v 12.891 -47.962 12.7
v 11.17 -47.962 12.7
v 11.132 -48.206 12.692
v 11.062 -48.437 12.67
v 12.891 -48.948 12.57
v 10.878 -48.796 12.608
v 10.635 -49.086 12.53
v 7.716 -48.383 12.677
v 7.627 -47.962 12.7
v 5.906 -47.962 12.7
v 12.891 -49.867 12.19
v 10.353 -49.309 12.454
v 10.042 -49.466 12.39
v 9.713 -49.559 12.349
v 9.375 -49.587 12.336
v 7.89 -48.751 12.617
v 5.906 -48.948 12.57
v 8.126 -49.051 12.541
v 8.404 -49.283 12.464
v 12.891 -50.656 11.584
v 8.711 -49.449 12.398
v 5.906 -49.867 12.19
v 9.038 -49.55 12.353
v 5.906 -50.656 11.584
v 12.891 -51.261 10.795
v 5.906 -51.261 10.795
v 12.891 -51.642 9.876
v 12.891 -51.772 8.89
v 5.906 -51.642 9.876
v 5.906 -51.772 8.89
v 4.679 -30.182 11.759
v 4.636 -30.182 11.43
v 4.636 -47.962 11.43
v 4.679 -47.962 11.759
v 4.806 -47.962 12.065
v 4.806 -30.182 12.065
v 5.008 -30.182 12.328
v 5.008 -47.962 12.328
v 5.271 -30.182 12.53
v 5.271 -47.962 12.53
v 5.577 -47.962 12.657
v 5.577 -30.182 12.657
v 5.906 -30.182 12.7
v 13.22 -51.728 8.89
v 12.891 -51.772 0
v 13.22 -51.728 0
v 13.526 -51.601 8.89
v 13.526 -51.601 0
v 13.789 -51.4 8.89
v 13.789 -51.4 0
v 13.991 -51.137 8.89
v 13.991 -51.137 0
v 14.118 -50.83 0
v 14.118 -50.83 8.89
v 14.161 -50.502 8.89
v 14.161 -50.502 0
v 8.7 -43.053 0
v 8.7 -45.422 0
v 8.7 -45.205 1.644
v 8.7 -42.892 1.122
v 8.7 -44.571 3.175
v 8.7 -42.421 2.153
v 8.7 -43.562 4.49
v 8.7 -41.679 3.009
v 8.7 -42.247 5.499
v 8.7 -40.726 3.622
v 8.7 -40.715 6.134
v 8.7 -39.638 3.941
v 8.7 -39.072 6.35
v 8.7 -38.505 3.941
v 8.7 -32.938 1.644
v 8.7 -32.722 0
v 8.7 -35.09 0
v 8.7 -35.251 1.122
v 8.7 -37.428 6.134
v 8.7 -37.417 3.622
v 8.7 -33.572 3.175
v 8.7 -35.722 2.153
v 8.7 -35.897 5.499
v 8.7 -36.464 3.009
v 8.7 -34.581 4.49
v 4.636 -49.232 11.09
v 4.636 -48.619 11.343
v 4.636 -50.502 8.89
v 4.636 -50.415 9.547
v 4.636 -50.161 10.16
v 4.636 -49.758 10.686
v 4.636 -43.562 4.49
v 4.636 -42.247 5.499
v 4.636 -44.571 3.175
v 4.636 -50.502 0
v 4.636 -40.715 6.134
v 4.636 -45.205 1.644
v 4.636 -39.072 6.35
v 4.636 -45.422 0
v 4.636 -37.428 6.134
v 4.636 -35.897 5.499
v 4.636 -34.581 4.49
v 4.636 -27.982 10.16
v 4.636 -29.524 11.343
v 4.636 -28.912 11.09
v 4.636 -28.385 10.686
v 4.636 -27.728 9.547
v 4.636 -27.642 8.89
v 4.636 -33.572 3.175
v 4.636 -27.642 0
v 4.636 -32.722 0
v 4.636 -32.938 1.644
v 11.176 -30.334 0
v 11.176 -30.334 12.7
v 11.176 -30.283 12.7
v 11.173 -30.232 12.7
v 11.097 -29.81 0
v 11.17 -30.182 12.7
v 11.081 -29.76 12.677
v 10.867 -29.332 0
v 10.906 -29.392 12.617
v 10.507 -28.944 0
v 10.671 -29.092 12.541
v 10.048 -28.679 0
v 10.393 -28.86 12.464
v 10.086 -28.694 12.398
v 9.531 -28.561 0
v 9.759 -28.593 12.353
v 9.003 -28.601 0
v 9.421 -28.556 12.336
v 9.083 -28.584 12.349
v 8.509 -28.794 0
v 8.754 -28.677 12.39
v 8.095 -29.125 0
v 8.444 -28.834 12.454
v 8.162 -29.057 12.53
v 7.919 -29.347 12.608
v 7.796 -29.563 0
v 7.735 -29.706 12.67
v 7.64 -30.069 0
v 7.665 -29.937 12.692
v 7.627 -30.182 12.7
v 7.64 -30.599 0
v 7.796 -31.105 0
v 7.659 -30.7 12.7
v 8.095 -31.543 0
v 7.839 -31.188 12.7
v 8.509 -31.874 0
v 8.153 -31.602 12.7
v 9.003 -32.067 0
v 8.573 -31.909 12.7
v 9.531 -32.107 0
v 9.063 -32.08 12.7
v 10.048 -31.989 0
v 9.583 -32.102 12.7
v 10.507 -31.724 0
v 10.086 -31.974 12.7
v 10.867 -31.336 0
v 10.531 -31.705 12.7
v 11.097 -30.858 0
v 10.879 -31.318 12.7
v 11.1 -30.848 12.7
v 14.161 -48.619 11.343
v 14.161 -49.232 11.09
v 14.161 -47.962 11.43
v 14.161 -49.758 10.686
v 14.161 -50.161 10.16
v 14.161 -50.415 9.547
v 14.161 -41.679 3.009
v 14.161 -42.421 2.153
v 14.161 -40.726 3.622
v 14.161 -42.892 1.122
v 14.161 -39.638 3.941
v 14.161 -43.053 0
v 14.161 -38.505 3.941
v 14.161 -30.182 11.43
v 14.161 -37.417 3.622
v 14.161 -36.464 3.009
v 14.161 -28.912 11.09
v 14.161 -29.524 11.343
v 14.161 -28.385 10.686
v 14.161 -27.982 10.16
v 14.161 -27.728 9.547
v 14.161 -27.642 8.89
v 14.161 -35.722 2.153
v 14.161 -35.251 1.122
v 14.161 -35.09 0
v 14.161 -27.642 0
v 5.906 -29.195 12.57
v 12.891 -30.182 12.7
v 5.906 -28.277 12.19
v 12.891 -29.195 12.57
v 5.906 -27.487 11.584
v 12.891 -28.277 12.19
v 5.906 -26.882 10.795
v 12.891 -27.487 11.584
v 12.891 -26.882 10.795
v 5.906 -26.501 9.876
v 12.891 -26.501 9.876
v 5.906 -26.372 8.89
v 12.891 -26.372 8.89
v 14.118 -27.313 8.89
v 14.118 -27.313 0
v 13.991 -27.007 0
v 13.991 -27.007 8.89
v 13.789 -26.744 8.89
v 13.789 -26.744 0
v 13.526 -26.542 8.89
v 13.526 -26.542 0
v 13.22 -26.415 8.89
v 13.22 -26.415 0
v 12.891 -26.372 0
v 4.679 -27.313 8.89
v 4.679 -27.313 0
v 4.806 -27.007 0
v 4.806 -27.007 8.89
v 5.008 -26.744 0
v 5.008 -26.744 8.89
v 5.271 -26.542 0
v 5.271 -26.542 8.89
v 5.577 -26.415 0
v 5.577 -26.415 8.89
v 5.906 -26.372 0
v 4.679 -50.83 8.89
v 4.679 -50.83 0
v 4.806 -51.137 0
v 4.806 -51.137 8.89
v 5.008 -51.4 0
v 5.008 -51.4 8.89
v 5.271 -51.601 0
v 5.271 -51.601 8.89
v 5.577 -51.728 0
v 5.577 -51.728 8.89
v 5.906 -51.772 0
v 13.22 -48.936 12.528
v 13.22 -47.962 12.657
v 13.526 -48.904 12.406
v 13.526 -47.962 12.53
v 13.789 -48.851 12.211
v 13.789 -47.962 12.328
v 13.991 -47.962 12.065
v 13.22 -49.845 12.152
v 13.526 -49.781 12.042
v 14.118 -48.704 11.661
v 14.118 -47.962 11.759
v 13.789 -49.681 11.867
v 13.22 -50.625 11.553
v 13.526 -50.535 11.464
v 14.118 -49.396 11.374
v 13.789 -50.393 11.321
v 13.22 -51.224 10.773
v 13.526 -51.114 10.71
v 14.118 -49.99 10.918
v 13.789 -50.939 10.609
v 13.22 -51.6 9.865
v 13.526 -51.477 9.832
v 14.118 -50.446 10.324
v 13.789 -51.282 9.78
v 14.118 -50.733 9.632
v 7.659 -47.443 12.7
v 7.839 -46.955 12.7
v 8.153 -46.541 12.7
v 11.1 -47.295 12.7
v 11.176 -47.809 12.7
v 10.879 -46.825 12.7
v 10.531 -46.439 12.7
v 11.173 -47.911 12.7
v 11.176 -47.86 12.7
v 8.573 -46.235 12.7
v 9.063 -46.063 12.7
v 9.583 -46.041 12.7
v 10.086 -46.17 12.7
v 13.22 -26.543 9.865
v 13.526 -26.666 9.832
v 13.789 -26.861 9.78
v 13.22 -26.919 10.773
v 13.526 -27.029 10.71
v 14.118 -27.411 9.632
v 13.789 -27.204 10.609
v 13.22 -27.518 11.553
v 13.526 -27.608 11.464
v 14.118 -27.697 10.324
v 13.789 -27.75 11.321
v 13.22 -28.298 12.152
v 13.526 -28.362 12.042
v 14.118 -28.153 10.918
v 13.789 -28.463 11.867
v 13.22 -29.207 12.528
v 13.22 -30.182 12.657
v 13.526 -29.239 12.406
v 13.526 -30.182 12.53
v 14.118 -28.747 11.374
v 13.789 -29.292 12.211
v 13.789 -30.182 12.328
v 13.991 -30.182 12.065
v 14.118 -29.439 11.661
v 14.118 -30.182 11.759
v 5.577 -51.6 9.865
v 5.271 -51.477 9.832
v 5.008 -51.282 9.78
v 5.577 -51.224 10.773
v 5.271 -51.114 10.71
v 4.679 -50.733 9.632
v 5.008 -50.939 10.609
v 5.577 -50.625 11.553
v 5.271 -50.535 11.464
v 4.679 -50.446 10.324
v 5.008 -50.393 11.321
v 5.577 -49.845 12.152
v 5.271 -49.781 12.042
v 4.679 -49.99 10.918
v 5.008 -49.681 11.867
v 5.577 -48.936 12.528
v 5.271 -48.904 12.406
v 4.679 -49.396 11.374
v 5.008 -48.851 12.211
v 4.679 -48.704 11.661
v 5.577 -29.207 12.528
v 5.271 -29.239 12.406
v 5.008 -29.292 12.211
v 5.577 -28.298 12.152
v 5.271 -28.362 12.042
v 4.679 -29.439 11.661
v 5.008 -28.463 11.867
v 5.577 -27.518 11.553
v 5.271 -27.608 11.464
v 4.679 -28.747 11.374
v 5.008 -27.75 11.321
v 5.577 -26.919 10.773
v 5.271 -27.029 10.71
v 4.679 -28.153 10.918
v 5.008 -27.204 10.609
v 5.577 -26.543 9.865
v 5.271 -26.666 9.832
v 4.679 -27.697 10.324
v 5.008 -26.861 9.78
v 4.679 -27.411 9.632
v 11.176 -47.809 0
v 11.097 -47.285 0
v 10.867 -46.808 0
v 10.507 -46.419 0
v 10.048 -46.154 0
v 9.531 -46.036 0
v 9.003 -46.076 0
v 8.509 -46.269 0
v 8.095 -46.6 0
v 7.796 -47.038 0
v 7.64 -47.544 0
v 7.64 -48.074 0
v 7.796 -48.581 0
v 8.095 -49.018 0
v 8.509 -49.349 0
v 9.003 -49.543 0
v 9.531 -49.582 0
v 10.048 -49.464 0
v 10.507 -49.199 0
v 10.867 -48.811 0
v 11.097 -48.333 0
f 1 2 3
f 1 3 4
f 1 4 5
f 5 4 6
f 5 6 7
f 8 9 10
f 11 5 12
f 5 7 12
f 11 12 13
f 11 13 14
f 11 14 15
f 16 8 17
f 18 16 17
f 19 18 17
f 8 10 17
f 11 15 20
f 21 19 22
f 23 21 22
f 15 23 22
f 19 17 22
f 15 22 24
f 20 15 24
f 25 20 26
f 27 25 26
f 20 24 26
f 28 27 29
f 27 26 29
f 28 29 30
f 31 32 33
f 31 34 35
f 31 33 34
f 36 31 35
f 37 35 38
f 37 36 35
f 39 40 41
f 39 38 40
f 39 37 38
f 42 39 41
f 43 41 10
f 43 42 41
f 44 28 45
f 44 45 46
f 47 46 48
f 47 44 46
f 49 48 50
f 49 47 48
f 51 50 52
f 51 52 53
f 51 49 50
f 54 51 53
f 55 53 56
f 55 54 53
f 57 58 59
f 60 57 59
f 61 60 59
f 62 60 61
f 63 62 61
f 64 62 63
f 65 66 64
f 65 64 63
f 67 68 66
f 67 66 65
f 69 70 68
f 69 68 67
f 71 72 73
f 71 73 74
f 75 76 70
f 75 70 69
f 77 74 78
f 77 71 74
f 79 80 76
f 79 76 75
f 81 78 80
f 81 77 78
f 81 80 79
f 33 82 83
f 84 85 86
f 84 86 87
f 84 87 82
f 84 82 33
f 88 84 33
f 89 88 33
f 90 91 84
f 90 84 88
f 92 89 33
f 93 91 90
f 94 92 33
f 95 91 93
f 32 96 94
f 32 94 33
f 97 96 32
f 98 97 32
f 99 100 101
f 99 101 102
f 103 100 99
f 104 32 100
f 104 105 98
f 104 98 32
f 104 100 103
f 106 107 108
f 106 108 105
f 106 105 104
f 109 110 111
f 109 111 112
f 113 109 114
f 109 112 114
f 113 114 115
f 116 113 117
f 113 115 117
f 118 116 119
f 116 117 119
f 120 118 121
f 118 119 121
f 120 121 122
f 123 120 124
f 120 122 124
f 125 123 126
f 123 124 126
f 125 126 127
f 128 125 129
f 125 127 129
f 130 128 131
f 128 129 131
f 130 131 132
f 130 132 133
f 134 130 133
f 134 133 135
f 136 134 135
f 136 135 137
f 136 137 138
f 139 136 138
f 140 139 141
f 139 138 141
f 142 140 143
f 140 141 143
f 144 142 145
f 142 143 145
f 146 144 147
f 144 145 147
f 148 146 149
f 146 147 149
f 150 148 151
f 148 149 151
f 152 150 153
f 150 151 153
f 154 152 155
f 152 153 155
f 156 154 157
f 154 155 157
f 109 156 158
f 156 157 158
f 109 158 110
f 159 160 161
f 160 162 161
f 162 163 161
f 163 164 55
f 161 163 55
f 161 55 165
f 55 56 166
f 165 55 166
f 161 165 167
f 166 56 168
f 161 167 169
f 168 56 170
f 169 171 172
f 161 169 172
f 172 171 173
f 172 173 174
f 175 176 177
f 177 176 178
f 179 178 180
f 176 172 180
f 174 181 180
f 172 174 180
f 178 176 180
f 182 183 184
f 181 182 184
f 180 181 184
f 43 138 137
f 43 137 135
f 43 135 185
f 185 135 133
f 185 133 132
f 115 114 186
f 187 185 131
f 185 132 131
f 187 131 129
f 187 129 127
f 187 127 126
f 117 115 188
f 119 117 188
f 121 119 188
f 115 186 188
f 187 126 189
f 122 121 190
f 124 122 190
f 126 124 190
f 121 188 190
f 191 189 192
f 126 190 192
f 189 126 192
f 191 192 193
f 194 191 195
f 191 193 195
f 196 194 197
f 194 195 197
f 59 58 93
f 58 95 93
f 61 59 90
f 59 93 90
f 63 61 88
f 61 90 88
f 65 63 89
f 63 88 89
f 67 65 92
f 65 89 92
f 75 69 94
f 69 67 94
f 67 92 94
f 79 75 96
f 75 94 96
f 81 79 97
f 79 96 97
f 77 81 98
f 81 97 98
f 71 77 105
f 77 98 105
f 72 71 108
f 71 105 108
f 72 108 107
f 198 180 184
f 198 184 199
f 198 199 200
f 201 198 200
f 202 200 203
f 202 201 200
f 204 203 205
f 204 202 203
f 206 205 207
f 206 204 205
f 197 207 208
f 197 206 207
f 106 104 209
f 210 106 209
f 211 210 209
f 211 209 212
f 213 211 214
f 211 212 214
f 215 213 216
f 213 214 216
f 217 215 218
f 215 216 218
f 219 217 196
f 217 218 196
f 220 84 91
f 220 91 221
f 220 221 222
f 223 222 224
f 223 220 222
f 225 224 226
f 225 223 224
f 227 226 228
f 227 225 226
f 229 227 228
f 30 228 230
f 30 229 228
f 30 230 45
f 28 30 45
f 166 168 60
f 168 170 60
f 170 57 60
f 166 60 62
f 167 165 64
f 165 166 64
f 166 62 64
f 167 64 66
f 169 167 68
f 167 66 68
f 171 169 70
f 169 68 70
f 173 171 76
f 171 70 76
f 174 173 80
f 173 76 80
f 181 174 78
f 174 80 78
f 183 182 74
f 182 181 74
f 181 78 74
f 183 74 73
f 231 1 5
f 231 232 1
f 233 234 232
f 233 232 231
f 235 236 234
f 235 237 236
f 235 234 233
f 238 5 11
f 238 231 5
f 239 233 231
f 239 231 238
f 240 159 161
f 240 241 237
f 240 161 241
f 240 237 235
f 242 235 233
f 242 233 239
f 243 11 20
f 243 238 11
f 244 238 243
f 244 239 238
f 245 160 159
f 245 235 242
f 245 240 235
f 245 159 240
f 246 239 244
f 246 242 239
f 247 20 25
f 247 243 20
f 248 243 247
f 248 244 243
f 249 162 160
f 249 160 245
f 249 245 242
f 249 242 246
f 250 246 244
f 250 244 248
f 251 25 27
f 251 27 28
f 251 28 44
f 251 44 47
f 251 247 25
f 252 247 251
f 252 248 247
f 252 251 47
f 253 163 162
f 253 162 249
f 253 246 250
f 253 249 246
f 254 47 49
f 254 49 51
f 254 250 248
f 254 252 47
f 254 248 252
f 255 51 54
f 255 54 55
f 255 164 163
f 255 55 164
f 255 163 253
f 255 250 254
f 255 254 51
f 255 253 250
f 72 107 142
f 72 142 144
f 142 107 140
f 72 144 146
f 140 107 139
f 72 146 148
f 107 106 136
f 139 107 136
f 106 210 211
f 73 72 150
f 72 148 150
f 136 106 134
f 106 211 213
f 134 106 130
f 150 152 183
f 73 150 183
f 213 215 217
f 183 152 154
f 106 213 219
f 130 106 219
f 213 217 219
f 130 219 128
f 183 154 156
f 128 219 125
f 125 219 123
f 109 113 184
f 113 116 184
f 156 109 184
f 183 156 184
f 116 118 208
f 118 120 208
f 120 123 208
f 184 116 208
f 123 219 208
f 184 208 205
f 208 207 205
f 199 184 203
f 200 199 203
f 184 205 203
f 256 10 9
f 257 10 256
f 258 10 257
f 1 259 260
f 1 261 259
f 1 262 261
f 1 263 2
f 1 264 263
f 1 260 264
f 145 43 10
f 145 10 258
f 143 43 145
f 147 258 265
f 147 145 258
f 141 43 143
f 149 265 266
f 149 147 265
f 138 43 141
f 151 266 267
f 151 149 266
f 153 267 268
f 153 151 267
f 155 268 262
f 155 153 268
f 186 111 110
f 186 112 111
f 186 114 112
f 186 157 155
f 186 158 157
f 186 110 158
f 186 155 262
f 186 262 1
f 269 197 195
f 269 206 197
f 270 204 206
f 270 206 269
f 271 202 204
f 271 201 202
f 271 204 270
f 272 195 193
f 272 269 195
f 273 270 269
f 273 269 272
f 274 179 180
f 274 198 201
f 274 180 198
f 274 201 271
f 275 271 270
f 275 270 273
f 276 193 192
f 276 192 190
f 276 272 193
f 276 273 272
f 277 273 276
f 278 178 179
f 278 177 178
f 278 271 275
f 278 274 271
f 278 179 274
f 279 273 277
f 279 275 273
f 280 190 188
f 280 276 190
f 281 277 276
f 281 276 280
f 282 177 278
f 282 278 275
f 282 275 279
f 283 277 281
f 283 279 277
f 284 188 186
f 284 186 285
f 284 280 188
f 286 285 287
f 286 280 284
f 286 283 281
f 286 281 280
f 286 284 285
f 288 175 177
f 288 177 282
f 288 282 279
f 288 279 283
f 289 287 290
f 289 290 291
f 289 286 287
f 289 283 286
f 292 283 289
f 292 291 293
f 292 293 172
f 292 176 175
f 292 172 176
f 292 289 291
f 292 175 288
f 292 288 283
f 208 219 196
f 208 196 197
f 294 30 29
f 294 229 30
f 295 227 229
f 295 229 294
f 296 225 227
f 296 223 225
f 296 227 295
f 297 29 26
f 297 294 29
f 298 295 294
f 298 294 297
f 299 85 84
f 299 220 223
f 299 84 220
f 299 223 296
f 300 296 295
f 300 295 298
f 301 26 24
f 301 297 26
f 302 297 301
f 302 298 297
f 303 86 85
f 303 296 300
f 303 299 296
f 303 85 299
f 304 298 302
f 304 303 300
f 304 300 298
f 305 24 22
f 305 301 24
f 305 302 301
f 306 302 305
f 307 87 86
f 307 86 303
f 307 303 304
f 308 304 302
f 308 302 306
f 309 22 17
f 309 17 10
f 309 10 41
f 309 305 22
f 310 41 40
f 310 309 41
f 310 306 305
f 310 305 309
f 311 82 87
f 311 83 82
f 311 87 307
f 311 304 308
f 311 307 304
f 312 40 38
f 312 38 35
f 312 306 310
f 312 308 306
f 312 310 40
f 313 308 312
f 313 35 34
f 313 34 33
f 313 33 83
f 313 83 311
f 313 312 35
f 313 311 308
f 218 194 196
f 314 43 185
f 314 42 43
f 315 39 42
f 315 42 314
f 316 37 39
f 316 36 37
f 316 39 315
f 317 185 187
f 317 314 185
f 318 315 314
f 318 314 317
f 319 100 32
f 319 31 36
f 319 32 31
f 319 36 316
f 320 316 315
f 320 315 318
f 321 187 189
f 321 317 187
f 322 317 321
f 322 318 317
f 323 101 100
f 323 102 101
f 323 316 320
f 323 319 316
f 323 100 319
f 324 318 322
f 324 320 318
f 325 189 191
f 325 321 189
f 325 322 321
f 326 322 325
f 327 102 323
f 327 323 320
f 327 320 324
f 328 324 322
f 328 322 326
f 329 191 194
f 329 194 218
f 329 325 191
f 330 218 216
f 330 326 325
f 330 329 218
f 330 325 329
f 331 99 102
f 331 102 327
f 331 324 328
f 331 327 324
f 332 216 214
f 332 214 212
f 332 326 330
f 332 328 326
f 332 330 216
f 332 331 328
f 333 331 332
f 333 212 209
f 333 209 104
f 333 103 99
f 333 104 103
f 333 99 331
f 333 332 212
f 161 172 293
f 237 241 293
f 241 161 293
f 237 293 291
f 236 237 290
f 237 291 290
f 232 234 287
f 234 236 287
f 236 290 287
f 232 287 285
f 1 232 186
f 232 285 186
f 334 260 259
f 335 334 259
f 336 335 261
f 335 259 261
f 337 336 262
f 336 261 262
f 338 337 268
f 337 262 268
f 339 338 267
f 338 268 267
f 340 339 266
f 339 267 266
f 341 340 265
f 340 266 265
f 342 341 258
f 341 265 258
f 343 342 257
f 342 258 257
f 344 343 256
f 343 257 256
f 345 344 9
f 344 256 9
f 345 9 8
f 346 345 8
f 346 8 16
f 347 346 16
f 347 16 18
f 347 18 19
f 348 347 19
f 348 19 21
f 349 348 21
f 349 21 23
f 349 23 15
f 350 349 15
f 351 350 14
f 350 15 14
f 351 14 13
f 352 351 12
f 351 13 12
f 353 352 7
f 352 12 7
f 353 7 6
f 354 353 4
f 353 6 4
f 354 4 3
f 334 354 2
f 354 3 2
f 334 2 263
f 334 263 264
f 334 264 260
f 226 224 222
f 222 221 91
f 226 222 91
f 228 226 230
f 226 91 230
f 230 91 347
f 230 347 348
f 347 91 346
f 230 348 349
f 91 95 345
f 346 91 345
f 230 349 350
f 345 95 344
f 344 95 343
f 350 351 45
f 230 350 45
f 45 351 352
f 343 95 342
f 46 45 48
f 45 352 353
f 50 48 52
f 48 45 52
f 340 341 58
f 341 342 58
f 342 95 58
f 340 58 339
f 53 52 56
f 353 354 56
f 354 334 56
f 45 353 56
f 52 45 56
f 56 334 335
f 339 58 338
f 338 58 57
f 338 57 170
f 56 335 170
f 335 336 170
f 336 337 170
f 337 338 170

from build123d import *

# Parameters (mm, degrees)
SKETCH2_W           = 9.525
SKETCH2_H           = 25.4
BOSS_EXTRUDE1_DEPTH = 12.7
FILLET1_R           = 1.27
FILLET2_R           = 3.81
SKETCH15_R          = 3.981833791
CUT_EXTRUDE12_DEPTH = 55.150798834
SKETCH14_R          = 6.35
CUT_EXTRUDE13_DEPTH = 4.064
SKETCH17_R          = 1.778
CUT_EXTRUDE14_DEPTH = 56.155369014


with BuildPart() as part:
    # Sketch2 → Boss-Extrude1 (new body)
    with BuildSketch(Plane.XY):
        with Locations((9.39840893, -39.07155)):
            Rectangle(SKETCH2_W, SKETCH2_H)
    extrude(amount=BOSS_EXTRUDE1_DEPTH)

    # Fillet1
    fillet1_edges = [part.edges().sort_by_distance(p)[0] for p in [
        (4.63590893, -39.07155, 12.7),
        (14.16090893, -39.07155, 12.7),
        (4.63590893, -51.77155, 6.35),
        (4.63590893, -26.37155, 6.35),
        (14.16090893, -26.37155, 6.35),
        (14.16090893, -51.77155, 6.35),
    ]]
    fillet(fillet1_edges, radius=FILLET1_R)

    # Fillet2
    # the kernel refuses this fillet: 3.81 mm, written as the material it takes off along each edge
    with BuildSketch(Plane(origin=(14.16090893, -47.96155, 8.89), x_dir=(0, 0, 1), z_dir=(0, 1, 0))) as fillet2_piece_1:
        with BuildLine():
            CenterArc((2.54, -1.27), 1.27, 0, 90)
            Line((3.81, -1.27), (3.81, 0))
            Line((3.81, 0), (2.54, 0))
        make_face()
    revolve(axis=Axis((14.16090893, -47.96155, 8.89), (1, 0, 0)), revolution_arc=90, mode=Mode.SUBTRACT)
    with BuildSketch(Plane(origin=(14.16090893, -30.18155, 8.89), x_dir=(0, 1, 0), z_dir=(0, 0, -1))) as fillet2_piece_2:
        with BuildLine():
            CenterArc((2.54, -1.27), 1.27, 0, 90)
            Line((3.81, -1.27), (3.81, 0))
            Line((3.81, 0), (2.54, 0))
        make_face()
    revolve(axis=Axis((14.16090893, -30.18155, 8.89), (1, 0, 0)), revolution_arc=90, mode=Mode.SUBTRACT)
    with BuildSketch(Plane(origin=(4.63590893, -47.96155, 8.89), x_dir=(0, -1, 0), z_dir=(0, 0, -1))) as fillet2_piece_3:
        with BuildLine():
            CenterArc((2.54, -1.27), 1.27, 0, 90)
            Line((3.81, -1.27), (3.81, 0))
            Line((3.81, 0), (2.54, 0))
        make_face()
    revolve(axis=Axis((4.63590893, -47.96155, 8.89), (-1, 0, 0)), revolution_arc=90, mode=Mode.SUBTRACT)
    with BuildSketch(Plane(origin=(4.63590893, -30.18155, 8.89), x_dir=(0, 0, 1), z_dir=(0, -1, 0))) as fillet2_piece_4:
        with BuildLine():
            CenterArc((2.54, -1.27), 1.27, 0, 90)
            Line((3.81, -1.27), (3.81, 0))
            Line((3.81, 0), (2.54, 0))
        make_face()
    revolve(axis=Axis((4.63590893, -30.18155, 8.89), (-1, 0, 0)), revolution_arc=90, mode=Mode.SUBTRACT)
    with BuildSketch(Plane(origin=(14.16090893, -26.37155, 12.7), x_dir=(0, 0, -1), z_dir=(-1, 0, 0)), Plane(origin=(4.63590893, -51.77155, 12.7), x_dir=(0, 0, -1), z_dir=(1, 0, 0))) as fillet2_piece_5:
        with BuildLine():
            CenterArc((FILLET2_R, FILLET2_R), FILLET2_R, 180, 90)
            Line((0, FILLET2_R), (0, 0))
            Line((0, 0), (FILLET2_R, 0))
        make_face()
    extrude(amount=9.525, mode=Mode.SUBTRACT)

    # Sketch15 → Cut-Extrude12 (cut, through all)
    with BuildSketch(Plane.ZY.offset(-4.63590893)):
        with Locations((0, -39.07155)):
            Circle(SKETCH15_R)
    extrude(amount=-CUT_EXTRUDE12_DEPTH, mode=Mode.SUBTRACT)

    # Sketch14 → Cut-Extrude13 (cut)
    with BuildSketch(Plane.ZY.offset(-4.63590893)):
        with Locations((0, -39.07155)):
            Circle(SKETCH14_R)
    extrude(amount=-CUT_EXTRUDE13_DEPTH, mode=Mode.SUBTRACT)

    # Sketch17 → Cut-Extrude14 (cut, through all)
    with BuildSketch(Plane.XY.offset(12.7)):
        with Locations((9.39840893, -47.80915)):
            Circle(SKETCH17_R)
        with Locations((9.39840893, -30.33395)):
            Circle(SKETCH17_R)
    extrude(amount=-CUT_EXTRUDE14_DEPTH, mode=Mode.SUBTRACT)


solid = part.part
